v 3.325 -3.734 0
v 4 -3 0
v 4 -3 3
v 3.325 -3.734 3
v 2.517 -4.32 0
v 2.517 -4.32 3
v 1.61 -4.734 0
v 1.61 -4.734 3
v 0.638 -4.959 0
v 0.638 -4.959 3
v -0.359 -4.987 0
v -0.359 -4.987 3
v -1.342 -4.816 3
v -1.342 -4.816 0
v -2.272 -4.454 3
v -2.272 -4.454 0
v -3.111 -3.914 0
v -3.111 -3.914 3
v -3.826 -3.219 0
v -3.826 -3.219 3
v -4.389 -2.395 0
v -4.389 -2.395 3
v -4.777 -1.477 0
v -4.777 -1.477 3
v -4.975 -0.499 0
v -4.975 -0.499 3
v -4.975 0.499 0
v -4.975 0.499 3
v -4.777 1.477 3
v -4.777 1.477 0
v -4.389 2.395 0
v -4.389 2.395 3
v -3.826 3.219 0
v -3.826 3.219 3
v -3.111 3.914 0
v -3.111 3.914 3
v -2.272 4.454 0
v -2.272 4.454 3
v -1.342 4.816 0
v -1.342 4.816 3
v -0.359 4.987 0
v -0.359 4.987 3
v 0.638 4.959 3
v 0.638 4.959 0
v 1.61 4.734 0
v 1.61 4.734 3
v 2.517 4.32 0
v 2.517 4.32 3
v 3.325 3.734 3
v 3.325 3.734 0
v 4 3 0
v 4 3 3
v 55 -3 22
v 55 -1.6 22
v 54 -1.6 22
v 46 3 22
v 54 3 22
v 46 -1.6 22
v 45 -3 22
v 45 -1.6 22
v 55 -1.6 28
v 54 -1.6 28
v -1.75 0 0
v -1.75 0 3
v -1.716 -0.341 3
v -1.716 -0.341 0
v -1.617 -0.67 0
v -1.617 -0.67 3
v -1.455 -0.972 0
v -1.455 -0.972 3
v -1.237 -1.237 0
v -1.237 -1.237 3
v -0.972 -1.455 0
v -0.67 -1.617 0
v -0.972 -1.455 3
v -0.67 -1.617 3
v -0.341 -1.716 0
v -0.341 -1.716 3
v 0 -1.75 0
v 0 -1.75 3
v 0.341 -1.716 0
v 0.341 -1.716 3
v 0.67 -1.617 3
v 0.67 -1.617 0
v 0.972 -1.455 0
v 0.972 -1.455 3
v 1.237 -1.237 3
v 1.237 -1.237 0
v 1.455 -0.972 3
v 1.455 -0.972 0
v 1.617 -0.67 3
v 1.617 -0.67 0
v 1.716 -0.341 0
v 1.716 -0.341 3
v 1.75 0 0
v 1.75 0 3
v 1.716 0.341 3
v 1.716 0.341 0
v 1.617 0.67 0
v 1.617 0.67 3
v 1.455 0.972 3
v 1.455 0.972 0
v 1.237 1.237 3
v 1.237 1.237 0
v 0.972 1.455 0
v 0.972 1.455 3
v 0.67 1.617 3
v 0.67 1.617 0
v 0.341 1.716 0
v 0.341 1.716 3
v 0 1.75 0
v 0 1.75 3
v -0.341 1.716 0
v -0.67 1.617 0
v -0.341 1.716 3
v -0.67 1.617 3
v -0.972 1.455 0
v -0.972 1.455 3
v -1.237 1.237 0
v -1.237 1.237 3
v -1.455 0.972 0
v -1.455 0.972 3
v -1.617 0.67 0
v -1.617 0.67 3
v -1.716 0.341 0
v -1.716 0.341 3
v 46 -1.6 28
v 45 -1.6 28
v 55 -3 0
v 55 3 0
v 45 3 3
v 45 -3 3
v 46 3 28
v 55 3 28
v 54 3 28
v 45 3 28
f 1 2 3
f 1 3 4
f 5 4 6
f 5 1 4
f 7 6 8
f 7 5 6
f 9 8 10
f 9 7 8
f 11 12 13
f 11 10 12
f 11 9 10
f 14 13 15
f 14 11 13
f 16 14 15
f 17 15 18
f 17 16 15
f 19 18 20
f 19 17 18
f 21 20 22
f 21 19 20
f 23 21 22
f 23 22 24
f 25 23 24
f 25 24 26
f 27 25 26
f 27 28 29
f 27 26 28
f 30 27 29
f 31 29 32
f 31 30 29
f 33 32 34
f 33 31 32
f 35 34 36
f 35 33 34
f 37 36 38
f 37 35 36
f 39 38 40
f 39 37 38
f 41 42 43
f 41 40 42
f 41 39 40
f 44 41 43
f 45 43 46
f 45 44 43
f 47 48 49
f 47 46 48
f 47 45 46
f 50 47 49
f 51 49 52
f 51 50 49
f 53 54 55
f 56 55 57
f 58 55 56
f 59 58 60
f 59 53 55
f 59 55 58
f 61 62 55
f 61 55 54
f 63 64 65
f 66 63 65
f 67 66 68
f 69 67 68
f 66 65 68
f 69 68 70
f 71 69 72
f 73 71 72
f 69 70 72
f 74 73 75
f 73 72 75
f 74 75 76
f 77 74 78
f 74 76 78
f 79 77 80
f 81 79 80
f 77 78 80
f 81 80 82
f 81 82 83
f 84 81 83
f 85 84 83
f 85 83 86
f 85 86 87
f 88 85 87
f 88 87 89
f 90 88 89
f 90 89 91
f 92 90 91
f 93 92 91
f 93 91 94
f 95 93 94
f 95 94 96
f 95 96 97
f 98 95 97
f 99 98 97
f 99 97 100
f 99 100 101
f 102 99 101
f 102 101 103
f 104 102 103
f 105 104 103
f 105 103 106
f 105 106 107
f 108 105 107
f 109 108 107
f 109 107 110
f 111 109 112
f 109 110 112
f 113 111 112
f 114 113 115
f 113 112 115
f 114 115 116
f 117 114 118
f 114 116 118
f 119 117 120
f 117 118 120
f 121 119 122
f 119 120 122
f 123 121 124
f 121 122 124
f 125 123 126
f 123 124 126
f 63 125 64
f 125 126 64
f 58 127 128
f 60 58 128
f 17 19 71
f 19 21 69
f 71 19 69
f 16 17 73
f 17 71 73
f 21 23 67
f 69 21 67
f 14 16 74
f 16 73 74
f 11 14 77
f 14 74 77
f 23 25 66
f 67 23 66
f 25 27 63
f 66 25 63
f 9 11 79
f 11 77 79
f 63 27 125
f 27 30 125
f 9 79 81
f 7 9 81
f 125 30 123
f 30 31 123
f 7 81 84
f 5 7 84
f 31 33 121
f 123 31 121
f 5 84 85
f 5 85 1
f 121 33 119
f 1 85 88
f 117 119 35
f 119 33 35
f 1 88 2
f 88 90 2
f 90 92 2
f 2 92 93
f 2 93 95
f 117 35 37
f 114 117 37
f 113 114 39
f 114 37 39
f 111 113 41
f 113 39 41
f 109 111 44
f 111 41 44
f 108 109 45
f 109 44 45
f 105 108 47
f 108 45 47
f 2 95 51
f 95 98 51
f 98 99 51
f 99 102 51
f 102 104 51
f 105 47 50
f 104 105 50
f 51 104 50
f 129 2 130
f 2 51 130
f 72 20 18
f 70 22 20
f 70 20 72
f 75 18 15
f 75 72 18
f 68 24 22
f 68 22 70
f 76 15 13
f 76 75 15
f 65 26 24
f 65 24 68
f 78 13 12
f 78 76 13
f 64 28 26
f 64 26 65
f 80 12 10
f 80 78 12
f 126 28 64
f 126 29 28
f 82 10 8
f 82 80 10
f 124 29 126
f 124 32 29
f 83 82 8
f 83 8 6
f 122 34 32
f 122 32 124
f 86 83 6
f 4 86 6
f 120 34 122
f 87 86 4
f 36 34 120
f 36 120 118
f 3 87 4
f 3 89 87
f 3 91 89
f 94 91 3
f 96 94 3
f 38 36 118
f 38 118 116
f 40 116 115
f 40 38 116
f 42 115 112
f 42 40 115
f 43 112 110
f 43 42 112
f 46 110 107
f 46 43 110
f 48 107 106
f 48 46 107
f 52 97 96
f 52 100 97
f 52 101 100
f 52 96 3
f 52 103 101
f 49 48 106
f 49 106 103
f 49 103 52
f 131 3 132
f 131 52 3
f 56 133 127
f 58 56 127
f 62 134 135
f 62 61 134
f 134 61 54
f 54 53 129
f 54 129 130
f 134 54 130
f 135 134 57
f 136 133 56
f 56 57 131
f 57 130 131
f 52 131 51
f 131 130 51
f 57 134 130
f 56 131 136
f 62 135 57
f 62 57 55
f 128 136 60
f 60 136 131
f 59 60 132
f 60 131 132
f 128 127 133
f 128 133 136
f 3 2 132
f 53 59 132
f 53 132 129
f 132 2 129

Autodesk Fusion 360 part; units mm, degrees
sketch "Sketch1" plane through (0, 0, 0) normal (0, 0, 1) x (1, 0, 0)
  line L0 (55, -3) -> (4, -3)
  line L1 (-55, -3) -> (-55, 3)
  line L2 (4, 3) -> (55, 3)
  line L3 (55, 3) -> (55, -3)
  arc A0 (4, 3) -> (4, -3) centre (0, 0) ccw
  dimension "d1" = 10
  dimension "d3" = 6
extrude "Extrude1" add sketch "Sketch1" along normal blind 3
sketch "Sketch2" plane through (0, 0, 3) normal (0, 0, 1) x (-1, 0, 0)
  line L0 (-55, -3) -> (-4, -3)
  arc A0 (-4, -3) -> (-4, 3) centre (0, 0) ccw
  line L1 (-4, 3) -> (-55, 3)
  line L2 (-55, 3) -> (-55, -3)
  circle A1 centre (0, 0) radius 1.75
  dimension "d8" = 3.5
extrude "Extrude2" cut sketch "Sketch2" against normal blind 3 contours A1
sketch "Sketch3" plane through (0, 0, 3) normal (0, 0, 1) x (-1, 0, 0)
  circle A0 centre (0, 0) radius 1.75
  line L0 (-55, -3) -> (-4, -3)
  arc A1 (-4, -3) -> (-4, 3) centre (0, 0) ccw
  line L1 (-4, 3) -> (-55, 3)
  line L2 (-55, 3) -> (-55, -3)
  line L3 (-55, -3) -> (-45, -3)
  line L4 (-45, -3) -> (-45, 3)
  line L5 (-45, 3) -> (-55, 3)
  line L6 (-55, 3) -> (-55, -3)
  dimension "d11" = 10
extrude "Extrude3" add sketch "Sketch3" along normal blind 25 contours L0 L1 L2 L3 L4 L5 L6
sketch "Sketch4" plane through (0, 0, 28) normal (0, 0, 1) x (-1, 0, 0)
  line L0 (-55, 3) -> (-55, -3)
  line L1 (-55, -3) -> (-45, -3)
  line L2 (-45, -3) -> (-45, 3)
  line L3 (-45, 3) -> (-55, 3)
  line L4 (-45, -3) -> (-46, -3)
  line L5 (-46, -3) -> (-46, 1.6)
  line L6 (-46, 1.6) -> (-45, 1.6)
  line L7 (-45, 1.6) -> (-45, -3)
  line L8 (-55, -3) -> (-54, -3)
  line L9 (-54, -3) -> (-54, 1.6)
  line L10 (-54, 1.6) -> (-55, 1.6)
  line L11 (-55, 1.6) -> (-55, -3)
  dimension "d14" = 4.6
  dimension "d15" = 1
extrude "Extrude4" cut sketch "Sketch4" against normal blind 6 contours L0 L1 L2 L3 L5 L6 L9 L10
